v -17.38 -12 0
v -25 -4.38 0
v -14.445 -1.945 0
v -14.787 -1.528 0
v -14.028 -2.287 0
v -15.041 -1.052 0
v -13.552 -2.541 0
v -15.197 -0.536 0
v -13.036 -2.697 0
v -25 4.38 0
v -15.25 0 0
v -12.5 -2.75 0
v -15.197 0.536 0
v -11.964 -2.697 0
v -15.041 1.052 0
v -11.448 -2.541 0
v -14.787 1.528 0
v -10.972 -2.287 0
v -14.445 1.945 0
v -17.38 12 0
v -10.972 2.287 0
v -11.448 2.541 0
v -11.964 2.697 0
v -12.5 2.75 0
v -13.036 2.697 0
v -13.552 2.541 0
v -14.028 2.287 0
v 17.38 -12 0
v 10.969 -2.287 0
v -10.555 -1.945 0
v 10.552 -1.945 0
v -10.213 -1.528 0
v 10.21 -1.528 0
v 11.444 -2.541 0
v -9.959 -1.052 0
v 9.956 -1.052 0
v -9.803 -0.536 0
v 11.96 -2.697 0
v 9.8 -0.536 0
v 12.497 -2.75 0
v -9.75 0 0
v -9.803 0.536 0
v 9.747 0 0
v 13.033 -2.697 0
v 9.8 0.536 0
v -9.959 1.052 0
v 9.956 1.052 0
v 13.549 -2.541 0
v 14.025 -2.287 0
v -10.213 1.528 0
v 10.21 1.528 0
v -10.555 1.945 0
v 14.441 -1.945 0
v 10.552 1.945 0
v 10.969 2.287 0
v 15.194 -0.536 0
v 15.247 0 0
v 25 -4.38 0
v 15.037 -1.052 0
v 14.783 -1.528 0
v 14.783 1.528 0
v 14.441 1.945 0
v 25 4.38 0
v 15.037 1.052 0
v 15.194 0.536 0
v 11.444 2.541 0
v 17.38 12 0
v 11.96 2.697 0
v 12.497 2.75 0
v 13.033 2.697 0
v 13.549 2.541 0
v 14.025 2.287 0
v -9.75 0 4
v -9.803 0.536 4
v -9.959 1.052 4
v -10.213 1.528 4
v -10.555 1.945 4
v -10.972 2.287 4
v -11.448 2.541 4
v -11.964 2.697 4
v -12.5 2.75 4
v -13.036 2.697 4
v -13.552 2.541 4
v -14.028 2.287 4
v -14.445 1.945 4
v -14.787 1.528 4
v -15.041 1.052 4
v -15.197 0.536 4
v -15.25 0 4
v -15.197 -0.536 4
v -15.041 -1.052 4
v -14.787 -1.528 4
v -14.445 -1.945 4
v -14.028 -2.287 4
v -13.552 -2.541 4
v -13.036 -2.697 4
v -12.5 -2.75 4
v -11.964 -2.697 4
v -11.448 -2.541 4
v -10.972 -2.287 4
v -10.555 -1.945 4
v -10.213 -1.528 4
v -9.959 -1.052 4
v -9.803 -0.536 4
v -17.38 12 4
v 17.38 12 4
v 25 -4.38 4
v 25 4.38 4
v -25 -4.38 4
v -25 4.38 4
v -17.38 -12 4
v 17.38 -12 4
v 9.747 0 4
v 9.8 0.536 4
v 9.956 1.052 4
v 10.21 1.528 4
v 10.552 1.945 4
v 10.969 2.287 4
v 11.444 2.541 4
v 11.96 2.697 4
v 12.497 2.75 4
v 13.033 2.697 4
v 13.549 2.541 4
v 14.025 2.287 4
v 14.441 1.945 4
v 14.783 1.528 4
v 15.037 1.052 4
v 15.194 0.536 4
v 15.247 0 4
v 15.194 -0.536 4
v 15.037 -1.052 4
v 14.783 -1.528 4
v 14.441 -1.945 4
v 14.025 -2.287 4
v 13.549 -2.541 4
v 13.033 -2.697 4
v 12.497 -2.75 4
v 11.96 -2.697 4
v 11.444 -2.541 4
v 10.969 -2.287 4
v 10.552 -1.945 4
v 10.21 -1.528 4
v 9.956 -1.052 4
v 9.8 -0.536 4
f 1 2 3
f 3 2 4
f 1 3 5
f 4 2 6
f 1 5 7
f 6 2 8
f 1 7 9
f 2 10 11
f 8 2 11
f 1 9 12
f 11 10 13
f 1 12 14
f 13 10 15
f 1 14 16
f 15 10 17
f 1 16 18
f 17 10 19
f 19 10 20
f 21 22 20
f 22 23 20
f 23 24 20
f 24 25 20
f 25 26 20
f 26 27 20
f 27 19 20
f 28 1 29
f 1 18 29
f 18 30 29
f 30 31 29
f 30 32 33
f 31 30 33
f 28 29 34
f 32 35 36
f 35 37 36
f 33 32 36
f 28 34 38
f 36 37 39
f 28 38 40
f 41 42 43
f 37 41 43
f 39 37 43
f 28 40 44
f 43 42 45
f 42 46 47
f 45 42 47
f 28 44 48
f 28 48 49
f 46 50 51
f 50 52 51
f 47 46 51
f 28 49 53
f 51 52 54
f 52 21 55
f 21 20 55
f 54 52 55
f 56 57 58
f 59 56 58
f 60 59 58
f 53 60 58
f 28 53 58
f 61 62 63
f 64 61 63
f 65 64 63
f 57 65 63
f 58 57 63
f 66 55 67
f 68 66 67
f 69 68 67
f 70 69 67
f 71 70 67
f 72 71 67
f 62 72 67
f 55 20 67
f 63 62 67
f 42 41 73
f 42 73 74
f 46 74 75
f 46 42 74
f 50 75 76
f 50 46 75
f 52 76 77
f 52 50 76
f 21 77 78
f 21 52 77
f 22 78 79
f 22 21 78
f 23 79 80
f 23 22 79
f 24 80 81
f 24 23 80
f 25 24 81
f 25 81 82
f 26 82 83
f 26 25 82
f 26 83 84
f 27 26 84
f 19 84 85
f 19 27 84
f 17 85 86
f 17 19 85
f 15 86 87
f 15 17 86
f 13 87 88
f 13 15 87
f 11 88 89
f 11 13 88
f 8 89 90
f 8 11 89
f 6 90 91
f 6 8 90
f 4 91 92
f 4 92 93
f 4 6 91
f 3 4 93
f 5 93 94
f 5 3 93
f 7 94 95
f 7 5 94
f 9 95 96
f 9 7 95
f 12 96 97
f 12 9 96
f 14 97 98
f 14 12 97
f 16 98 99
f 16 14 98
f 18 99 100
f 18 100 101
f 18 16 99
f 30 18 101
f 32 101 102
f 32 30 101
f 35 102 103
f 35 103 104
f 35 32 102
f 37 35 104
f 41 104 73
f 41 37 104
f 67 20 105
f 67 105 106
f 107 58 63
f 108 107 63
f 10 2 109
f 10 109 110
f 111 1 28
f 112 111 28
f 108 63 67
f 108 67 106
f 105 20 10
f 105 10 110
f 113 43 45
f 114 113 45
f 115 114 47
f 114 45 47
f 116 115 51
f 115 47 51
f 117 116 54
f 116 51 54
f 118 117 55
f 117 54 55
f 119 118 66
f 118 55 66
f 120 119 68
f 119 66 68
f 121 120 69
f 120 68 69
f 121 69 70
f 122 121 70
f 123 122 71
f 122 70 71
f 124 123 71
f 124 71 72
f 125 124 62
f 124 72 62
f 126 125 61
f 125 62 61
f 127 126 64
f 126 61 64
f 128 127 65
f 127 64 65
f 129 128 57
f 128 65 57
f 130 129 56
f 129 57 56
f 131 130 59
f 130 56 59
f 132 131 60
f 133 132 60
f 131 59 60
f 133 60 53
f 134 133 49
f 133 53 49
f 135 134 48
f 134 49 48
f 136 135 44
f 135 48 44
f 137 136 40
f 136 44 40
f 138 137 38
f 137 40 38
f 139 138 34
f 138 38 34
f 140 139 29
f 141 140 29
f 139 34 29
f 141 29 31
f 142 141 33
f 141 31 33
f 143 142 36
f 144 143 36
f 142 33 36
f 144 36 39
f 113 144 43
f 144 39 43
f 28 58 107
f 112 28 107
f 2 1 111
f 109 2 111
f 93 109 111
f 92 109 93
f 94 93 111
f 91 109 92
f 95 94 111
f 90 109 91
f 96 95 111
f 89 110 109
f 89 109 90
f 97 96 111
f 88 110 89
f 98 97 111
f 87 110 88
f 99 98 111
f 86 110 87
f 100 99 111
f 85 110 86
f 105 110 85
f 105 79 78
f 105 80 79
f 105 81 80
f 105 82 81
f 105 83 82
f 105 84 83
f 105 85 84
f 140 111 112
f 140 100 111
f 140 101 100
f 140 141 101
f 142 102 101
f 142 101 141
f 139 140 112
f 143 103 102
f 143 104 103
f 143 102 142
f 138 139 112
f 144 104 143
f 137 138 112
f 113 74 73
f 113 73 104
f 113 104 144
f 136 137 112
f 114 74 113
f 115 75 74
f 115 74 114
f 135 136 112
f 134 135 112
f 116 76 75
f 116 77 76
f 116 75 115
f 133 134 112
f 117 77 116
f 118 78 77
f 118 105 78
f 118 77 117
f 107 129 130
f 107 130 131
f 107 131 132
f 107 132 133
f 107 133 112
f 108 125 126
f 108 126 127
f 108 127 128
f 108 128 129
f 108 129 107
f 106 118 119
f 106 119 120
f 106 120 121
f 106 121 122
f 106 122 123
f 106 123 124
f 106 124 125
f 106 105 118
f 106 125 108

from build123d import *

# Parameters (mm, degrees)
F0_W     = 50
F0_H     = 24
F0_R     = 2.75
F1_DEPTH = 4
F2_SIZE  = 7.62


with BuildPart() as f1:
    # F0 (on Top) → F1 (new body)
    with BuildSketch(Plane.XY):
        Rectangle(F0_W, F0_H)
        with Locations((-12.5, 0)):
            Circle(F0_R, mode=Mode.SUBTRACT)
        with BuildLine():
            ThreePointArc((15.2468, 0), (12.4968, -2.75), (9.7468, 0))
            ThreePointArc((9.7468, 0), (12.4968, 2.75), (15.2468, 0))
        make_face(mode=Mode.SUBTRACT)
    extrude(amount=F1_DEPTH)

    # F2
    f2_edges = [f1.edges().sort_by_distance(p)[0] for p in [
        (-25, 12, 2),
        (-25, -12, 2),
        (25, -12, 2),
        (25, 12, 2),
    ]]
    chamfer(f2_edges, length=F2_SIZE)


solid = f1.part
